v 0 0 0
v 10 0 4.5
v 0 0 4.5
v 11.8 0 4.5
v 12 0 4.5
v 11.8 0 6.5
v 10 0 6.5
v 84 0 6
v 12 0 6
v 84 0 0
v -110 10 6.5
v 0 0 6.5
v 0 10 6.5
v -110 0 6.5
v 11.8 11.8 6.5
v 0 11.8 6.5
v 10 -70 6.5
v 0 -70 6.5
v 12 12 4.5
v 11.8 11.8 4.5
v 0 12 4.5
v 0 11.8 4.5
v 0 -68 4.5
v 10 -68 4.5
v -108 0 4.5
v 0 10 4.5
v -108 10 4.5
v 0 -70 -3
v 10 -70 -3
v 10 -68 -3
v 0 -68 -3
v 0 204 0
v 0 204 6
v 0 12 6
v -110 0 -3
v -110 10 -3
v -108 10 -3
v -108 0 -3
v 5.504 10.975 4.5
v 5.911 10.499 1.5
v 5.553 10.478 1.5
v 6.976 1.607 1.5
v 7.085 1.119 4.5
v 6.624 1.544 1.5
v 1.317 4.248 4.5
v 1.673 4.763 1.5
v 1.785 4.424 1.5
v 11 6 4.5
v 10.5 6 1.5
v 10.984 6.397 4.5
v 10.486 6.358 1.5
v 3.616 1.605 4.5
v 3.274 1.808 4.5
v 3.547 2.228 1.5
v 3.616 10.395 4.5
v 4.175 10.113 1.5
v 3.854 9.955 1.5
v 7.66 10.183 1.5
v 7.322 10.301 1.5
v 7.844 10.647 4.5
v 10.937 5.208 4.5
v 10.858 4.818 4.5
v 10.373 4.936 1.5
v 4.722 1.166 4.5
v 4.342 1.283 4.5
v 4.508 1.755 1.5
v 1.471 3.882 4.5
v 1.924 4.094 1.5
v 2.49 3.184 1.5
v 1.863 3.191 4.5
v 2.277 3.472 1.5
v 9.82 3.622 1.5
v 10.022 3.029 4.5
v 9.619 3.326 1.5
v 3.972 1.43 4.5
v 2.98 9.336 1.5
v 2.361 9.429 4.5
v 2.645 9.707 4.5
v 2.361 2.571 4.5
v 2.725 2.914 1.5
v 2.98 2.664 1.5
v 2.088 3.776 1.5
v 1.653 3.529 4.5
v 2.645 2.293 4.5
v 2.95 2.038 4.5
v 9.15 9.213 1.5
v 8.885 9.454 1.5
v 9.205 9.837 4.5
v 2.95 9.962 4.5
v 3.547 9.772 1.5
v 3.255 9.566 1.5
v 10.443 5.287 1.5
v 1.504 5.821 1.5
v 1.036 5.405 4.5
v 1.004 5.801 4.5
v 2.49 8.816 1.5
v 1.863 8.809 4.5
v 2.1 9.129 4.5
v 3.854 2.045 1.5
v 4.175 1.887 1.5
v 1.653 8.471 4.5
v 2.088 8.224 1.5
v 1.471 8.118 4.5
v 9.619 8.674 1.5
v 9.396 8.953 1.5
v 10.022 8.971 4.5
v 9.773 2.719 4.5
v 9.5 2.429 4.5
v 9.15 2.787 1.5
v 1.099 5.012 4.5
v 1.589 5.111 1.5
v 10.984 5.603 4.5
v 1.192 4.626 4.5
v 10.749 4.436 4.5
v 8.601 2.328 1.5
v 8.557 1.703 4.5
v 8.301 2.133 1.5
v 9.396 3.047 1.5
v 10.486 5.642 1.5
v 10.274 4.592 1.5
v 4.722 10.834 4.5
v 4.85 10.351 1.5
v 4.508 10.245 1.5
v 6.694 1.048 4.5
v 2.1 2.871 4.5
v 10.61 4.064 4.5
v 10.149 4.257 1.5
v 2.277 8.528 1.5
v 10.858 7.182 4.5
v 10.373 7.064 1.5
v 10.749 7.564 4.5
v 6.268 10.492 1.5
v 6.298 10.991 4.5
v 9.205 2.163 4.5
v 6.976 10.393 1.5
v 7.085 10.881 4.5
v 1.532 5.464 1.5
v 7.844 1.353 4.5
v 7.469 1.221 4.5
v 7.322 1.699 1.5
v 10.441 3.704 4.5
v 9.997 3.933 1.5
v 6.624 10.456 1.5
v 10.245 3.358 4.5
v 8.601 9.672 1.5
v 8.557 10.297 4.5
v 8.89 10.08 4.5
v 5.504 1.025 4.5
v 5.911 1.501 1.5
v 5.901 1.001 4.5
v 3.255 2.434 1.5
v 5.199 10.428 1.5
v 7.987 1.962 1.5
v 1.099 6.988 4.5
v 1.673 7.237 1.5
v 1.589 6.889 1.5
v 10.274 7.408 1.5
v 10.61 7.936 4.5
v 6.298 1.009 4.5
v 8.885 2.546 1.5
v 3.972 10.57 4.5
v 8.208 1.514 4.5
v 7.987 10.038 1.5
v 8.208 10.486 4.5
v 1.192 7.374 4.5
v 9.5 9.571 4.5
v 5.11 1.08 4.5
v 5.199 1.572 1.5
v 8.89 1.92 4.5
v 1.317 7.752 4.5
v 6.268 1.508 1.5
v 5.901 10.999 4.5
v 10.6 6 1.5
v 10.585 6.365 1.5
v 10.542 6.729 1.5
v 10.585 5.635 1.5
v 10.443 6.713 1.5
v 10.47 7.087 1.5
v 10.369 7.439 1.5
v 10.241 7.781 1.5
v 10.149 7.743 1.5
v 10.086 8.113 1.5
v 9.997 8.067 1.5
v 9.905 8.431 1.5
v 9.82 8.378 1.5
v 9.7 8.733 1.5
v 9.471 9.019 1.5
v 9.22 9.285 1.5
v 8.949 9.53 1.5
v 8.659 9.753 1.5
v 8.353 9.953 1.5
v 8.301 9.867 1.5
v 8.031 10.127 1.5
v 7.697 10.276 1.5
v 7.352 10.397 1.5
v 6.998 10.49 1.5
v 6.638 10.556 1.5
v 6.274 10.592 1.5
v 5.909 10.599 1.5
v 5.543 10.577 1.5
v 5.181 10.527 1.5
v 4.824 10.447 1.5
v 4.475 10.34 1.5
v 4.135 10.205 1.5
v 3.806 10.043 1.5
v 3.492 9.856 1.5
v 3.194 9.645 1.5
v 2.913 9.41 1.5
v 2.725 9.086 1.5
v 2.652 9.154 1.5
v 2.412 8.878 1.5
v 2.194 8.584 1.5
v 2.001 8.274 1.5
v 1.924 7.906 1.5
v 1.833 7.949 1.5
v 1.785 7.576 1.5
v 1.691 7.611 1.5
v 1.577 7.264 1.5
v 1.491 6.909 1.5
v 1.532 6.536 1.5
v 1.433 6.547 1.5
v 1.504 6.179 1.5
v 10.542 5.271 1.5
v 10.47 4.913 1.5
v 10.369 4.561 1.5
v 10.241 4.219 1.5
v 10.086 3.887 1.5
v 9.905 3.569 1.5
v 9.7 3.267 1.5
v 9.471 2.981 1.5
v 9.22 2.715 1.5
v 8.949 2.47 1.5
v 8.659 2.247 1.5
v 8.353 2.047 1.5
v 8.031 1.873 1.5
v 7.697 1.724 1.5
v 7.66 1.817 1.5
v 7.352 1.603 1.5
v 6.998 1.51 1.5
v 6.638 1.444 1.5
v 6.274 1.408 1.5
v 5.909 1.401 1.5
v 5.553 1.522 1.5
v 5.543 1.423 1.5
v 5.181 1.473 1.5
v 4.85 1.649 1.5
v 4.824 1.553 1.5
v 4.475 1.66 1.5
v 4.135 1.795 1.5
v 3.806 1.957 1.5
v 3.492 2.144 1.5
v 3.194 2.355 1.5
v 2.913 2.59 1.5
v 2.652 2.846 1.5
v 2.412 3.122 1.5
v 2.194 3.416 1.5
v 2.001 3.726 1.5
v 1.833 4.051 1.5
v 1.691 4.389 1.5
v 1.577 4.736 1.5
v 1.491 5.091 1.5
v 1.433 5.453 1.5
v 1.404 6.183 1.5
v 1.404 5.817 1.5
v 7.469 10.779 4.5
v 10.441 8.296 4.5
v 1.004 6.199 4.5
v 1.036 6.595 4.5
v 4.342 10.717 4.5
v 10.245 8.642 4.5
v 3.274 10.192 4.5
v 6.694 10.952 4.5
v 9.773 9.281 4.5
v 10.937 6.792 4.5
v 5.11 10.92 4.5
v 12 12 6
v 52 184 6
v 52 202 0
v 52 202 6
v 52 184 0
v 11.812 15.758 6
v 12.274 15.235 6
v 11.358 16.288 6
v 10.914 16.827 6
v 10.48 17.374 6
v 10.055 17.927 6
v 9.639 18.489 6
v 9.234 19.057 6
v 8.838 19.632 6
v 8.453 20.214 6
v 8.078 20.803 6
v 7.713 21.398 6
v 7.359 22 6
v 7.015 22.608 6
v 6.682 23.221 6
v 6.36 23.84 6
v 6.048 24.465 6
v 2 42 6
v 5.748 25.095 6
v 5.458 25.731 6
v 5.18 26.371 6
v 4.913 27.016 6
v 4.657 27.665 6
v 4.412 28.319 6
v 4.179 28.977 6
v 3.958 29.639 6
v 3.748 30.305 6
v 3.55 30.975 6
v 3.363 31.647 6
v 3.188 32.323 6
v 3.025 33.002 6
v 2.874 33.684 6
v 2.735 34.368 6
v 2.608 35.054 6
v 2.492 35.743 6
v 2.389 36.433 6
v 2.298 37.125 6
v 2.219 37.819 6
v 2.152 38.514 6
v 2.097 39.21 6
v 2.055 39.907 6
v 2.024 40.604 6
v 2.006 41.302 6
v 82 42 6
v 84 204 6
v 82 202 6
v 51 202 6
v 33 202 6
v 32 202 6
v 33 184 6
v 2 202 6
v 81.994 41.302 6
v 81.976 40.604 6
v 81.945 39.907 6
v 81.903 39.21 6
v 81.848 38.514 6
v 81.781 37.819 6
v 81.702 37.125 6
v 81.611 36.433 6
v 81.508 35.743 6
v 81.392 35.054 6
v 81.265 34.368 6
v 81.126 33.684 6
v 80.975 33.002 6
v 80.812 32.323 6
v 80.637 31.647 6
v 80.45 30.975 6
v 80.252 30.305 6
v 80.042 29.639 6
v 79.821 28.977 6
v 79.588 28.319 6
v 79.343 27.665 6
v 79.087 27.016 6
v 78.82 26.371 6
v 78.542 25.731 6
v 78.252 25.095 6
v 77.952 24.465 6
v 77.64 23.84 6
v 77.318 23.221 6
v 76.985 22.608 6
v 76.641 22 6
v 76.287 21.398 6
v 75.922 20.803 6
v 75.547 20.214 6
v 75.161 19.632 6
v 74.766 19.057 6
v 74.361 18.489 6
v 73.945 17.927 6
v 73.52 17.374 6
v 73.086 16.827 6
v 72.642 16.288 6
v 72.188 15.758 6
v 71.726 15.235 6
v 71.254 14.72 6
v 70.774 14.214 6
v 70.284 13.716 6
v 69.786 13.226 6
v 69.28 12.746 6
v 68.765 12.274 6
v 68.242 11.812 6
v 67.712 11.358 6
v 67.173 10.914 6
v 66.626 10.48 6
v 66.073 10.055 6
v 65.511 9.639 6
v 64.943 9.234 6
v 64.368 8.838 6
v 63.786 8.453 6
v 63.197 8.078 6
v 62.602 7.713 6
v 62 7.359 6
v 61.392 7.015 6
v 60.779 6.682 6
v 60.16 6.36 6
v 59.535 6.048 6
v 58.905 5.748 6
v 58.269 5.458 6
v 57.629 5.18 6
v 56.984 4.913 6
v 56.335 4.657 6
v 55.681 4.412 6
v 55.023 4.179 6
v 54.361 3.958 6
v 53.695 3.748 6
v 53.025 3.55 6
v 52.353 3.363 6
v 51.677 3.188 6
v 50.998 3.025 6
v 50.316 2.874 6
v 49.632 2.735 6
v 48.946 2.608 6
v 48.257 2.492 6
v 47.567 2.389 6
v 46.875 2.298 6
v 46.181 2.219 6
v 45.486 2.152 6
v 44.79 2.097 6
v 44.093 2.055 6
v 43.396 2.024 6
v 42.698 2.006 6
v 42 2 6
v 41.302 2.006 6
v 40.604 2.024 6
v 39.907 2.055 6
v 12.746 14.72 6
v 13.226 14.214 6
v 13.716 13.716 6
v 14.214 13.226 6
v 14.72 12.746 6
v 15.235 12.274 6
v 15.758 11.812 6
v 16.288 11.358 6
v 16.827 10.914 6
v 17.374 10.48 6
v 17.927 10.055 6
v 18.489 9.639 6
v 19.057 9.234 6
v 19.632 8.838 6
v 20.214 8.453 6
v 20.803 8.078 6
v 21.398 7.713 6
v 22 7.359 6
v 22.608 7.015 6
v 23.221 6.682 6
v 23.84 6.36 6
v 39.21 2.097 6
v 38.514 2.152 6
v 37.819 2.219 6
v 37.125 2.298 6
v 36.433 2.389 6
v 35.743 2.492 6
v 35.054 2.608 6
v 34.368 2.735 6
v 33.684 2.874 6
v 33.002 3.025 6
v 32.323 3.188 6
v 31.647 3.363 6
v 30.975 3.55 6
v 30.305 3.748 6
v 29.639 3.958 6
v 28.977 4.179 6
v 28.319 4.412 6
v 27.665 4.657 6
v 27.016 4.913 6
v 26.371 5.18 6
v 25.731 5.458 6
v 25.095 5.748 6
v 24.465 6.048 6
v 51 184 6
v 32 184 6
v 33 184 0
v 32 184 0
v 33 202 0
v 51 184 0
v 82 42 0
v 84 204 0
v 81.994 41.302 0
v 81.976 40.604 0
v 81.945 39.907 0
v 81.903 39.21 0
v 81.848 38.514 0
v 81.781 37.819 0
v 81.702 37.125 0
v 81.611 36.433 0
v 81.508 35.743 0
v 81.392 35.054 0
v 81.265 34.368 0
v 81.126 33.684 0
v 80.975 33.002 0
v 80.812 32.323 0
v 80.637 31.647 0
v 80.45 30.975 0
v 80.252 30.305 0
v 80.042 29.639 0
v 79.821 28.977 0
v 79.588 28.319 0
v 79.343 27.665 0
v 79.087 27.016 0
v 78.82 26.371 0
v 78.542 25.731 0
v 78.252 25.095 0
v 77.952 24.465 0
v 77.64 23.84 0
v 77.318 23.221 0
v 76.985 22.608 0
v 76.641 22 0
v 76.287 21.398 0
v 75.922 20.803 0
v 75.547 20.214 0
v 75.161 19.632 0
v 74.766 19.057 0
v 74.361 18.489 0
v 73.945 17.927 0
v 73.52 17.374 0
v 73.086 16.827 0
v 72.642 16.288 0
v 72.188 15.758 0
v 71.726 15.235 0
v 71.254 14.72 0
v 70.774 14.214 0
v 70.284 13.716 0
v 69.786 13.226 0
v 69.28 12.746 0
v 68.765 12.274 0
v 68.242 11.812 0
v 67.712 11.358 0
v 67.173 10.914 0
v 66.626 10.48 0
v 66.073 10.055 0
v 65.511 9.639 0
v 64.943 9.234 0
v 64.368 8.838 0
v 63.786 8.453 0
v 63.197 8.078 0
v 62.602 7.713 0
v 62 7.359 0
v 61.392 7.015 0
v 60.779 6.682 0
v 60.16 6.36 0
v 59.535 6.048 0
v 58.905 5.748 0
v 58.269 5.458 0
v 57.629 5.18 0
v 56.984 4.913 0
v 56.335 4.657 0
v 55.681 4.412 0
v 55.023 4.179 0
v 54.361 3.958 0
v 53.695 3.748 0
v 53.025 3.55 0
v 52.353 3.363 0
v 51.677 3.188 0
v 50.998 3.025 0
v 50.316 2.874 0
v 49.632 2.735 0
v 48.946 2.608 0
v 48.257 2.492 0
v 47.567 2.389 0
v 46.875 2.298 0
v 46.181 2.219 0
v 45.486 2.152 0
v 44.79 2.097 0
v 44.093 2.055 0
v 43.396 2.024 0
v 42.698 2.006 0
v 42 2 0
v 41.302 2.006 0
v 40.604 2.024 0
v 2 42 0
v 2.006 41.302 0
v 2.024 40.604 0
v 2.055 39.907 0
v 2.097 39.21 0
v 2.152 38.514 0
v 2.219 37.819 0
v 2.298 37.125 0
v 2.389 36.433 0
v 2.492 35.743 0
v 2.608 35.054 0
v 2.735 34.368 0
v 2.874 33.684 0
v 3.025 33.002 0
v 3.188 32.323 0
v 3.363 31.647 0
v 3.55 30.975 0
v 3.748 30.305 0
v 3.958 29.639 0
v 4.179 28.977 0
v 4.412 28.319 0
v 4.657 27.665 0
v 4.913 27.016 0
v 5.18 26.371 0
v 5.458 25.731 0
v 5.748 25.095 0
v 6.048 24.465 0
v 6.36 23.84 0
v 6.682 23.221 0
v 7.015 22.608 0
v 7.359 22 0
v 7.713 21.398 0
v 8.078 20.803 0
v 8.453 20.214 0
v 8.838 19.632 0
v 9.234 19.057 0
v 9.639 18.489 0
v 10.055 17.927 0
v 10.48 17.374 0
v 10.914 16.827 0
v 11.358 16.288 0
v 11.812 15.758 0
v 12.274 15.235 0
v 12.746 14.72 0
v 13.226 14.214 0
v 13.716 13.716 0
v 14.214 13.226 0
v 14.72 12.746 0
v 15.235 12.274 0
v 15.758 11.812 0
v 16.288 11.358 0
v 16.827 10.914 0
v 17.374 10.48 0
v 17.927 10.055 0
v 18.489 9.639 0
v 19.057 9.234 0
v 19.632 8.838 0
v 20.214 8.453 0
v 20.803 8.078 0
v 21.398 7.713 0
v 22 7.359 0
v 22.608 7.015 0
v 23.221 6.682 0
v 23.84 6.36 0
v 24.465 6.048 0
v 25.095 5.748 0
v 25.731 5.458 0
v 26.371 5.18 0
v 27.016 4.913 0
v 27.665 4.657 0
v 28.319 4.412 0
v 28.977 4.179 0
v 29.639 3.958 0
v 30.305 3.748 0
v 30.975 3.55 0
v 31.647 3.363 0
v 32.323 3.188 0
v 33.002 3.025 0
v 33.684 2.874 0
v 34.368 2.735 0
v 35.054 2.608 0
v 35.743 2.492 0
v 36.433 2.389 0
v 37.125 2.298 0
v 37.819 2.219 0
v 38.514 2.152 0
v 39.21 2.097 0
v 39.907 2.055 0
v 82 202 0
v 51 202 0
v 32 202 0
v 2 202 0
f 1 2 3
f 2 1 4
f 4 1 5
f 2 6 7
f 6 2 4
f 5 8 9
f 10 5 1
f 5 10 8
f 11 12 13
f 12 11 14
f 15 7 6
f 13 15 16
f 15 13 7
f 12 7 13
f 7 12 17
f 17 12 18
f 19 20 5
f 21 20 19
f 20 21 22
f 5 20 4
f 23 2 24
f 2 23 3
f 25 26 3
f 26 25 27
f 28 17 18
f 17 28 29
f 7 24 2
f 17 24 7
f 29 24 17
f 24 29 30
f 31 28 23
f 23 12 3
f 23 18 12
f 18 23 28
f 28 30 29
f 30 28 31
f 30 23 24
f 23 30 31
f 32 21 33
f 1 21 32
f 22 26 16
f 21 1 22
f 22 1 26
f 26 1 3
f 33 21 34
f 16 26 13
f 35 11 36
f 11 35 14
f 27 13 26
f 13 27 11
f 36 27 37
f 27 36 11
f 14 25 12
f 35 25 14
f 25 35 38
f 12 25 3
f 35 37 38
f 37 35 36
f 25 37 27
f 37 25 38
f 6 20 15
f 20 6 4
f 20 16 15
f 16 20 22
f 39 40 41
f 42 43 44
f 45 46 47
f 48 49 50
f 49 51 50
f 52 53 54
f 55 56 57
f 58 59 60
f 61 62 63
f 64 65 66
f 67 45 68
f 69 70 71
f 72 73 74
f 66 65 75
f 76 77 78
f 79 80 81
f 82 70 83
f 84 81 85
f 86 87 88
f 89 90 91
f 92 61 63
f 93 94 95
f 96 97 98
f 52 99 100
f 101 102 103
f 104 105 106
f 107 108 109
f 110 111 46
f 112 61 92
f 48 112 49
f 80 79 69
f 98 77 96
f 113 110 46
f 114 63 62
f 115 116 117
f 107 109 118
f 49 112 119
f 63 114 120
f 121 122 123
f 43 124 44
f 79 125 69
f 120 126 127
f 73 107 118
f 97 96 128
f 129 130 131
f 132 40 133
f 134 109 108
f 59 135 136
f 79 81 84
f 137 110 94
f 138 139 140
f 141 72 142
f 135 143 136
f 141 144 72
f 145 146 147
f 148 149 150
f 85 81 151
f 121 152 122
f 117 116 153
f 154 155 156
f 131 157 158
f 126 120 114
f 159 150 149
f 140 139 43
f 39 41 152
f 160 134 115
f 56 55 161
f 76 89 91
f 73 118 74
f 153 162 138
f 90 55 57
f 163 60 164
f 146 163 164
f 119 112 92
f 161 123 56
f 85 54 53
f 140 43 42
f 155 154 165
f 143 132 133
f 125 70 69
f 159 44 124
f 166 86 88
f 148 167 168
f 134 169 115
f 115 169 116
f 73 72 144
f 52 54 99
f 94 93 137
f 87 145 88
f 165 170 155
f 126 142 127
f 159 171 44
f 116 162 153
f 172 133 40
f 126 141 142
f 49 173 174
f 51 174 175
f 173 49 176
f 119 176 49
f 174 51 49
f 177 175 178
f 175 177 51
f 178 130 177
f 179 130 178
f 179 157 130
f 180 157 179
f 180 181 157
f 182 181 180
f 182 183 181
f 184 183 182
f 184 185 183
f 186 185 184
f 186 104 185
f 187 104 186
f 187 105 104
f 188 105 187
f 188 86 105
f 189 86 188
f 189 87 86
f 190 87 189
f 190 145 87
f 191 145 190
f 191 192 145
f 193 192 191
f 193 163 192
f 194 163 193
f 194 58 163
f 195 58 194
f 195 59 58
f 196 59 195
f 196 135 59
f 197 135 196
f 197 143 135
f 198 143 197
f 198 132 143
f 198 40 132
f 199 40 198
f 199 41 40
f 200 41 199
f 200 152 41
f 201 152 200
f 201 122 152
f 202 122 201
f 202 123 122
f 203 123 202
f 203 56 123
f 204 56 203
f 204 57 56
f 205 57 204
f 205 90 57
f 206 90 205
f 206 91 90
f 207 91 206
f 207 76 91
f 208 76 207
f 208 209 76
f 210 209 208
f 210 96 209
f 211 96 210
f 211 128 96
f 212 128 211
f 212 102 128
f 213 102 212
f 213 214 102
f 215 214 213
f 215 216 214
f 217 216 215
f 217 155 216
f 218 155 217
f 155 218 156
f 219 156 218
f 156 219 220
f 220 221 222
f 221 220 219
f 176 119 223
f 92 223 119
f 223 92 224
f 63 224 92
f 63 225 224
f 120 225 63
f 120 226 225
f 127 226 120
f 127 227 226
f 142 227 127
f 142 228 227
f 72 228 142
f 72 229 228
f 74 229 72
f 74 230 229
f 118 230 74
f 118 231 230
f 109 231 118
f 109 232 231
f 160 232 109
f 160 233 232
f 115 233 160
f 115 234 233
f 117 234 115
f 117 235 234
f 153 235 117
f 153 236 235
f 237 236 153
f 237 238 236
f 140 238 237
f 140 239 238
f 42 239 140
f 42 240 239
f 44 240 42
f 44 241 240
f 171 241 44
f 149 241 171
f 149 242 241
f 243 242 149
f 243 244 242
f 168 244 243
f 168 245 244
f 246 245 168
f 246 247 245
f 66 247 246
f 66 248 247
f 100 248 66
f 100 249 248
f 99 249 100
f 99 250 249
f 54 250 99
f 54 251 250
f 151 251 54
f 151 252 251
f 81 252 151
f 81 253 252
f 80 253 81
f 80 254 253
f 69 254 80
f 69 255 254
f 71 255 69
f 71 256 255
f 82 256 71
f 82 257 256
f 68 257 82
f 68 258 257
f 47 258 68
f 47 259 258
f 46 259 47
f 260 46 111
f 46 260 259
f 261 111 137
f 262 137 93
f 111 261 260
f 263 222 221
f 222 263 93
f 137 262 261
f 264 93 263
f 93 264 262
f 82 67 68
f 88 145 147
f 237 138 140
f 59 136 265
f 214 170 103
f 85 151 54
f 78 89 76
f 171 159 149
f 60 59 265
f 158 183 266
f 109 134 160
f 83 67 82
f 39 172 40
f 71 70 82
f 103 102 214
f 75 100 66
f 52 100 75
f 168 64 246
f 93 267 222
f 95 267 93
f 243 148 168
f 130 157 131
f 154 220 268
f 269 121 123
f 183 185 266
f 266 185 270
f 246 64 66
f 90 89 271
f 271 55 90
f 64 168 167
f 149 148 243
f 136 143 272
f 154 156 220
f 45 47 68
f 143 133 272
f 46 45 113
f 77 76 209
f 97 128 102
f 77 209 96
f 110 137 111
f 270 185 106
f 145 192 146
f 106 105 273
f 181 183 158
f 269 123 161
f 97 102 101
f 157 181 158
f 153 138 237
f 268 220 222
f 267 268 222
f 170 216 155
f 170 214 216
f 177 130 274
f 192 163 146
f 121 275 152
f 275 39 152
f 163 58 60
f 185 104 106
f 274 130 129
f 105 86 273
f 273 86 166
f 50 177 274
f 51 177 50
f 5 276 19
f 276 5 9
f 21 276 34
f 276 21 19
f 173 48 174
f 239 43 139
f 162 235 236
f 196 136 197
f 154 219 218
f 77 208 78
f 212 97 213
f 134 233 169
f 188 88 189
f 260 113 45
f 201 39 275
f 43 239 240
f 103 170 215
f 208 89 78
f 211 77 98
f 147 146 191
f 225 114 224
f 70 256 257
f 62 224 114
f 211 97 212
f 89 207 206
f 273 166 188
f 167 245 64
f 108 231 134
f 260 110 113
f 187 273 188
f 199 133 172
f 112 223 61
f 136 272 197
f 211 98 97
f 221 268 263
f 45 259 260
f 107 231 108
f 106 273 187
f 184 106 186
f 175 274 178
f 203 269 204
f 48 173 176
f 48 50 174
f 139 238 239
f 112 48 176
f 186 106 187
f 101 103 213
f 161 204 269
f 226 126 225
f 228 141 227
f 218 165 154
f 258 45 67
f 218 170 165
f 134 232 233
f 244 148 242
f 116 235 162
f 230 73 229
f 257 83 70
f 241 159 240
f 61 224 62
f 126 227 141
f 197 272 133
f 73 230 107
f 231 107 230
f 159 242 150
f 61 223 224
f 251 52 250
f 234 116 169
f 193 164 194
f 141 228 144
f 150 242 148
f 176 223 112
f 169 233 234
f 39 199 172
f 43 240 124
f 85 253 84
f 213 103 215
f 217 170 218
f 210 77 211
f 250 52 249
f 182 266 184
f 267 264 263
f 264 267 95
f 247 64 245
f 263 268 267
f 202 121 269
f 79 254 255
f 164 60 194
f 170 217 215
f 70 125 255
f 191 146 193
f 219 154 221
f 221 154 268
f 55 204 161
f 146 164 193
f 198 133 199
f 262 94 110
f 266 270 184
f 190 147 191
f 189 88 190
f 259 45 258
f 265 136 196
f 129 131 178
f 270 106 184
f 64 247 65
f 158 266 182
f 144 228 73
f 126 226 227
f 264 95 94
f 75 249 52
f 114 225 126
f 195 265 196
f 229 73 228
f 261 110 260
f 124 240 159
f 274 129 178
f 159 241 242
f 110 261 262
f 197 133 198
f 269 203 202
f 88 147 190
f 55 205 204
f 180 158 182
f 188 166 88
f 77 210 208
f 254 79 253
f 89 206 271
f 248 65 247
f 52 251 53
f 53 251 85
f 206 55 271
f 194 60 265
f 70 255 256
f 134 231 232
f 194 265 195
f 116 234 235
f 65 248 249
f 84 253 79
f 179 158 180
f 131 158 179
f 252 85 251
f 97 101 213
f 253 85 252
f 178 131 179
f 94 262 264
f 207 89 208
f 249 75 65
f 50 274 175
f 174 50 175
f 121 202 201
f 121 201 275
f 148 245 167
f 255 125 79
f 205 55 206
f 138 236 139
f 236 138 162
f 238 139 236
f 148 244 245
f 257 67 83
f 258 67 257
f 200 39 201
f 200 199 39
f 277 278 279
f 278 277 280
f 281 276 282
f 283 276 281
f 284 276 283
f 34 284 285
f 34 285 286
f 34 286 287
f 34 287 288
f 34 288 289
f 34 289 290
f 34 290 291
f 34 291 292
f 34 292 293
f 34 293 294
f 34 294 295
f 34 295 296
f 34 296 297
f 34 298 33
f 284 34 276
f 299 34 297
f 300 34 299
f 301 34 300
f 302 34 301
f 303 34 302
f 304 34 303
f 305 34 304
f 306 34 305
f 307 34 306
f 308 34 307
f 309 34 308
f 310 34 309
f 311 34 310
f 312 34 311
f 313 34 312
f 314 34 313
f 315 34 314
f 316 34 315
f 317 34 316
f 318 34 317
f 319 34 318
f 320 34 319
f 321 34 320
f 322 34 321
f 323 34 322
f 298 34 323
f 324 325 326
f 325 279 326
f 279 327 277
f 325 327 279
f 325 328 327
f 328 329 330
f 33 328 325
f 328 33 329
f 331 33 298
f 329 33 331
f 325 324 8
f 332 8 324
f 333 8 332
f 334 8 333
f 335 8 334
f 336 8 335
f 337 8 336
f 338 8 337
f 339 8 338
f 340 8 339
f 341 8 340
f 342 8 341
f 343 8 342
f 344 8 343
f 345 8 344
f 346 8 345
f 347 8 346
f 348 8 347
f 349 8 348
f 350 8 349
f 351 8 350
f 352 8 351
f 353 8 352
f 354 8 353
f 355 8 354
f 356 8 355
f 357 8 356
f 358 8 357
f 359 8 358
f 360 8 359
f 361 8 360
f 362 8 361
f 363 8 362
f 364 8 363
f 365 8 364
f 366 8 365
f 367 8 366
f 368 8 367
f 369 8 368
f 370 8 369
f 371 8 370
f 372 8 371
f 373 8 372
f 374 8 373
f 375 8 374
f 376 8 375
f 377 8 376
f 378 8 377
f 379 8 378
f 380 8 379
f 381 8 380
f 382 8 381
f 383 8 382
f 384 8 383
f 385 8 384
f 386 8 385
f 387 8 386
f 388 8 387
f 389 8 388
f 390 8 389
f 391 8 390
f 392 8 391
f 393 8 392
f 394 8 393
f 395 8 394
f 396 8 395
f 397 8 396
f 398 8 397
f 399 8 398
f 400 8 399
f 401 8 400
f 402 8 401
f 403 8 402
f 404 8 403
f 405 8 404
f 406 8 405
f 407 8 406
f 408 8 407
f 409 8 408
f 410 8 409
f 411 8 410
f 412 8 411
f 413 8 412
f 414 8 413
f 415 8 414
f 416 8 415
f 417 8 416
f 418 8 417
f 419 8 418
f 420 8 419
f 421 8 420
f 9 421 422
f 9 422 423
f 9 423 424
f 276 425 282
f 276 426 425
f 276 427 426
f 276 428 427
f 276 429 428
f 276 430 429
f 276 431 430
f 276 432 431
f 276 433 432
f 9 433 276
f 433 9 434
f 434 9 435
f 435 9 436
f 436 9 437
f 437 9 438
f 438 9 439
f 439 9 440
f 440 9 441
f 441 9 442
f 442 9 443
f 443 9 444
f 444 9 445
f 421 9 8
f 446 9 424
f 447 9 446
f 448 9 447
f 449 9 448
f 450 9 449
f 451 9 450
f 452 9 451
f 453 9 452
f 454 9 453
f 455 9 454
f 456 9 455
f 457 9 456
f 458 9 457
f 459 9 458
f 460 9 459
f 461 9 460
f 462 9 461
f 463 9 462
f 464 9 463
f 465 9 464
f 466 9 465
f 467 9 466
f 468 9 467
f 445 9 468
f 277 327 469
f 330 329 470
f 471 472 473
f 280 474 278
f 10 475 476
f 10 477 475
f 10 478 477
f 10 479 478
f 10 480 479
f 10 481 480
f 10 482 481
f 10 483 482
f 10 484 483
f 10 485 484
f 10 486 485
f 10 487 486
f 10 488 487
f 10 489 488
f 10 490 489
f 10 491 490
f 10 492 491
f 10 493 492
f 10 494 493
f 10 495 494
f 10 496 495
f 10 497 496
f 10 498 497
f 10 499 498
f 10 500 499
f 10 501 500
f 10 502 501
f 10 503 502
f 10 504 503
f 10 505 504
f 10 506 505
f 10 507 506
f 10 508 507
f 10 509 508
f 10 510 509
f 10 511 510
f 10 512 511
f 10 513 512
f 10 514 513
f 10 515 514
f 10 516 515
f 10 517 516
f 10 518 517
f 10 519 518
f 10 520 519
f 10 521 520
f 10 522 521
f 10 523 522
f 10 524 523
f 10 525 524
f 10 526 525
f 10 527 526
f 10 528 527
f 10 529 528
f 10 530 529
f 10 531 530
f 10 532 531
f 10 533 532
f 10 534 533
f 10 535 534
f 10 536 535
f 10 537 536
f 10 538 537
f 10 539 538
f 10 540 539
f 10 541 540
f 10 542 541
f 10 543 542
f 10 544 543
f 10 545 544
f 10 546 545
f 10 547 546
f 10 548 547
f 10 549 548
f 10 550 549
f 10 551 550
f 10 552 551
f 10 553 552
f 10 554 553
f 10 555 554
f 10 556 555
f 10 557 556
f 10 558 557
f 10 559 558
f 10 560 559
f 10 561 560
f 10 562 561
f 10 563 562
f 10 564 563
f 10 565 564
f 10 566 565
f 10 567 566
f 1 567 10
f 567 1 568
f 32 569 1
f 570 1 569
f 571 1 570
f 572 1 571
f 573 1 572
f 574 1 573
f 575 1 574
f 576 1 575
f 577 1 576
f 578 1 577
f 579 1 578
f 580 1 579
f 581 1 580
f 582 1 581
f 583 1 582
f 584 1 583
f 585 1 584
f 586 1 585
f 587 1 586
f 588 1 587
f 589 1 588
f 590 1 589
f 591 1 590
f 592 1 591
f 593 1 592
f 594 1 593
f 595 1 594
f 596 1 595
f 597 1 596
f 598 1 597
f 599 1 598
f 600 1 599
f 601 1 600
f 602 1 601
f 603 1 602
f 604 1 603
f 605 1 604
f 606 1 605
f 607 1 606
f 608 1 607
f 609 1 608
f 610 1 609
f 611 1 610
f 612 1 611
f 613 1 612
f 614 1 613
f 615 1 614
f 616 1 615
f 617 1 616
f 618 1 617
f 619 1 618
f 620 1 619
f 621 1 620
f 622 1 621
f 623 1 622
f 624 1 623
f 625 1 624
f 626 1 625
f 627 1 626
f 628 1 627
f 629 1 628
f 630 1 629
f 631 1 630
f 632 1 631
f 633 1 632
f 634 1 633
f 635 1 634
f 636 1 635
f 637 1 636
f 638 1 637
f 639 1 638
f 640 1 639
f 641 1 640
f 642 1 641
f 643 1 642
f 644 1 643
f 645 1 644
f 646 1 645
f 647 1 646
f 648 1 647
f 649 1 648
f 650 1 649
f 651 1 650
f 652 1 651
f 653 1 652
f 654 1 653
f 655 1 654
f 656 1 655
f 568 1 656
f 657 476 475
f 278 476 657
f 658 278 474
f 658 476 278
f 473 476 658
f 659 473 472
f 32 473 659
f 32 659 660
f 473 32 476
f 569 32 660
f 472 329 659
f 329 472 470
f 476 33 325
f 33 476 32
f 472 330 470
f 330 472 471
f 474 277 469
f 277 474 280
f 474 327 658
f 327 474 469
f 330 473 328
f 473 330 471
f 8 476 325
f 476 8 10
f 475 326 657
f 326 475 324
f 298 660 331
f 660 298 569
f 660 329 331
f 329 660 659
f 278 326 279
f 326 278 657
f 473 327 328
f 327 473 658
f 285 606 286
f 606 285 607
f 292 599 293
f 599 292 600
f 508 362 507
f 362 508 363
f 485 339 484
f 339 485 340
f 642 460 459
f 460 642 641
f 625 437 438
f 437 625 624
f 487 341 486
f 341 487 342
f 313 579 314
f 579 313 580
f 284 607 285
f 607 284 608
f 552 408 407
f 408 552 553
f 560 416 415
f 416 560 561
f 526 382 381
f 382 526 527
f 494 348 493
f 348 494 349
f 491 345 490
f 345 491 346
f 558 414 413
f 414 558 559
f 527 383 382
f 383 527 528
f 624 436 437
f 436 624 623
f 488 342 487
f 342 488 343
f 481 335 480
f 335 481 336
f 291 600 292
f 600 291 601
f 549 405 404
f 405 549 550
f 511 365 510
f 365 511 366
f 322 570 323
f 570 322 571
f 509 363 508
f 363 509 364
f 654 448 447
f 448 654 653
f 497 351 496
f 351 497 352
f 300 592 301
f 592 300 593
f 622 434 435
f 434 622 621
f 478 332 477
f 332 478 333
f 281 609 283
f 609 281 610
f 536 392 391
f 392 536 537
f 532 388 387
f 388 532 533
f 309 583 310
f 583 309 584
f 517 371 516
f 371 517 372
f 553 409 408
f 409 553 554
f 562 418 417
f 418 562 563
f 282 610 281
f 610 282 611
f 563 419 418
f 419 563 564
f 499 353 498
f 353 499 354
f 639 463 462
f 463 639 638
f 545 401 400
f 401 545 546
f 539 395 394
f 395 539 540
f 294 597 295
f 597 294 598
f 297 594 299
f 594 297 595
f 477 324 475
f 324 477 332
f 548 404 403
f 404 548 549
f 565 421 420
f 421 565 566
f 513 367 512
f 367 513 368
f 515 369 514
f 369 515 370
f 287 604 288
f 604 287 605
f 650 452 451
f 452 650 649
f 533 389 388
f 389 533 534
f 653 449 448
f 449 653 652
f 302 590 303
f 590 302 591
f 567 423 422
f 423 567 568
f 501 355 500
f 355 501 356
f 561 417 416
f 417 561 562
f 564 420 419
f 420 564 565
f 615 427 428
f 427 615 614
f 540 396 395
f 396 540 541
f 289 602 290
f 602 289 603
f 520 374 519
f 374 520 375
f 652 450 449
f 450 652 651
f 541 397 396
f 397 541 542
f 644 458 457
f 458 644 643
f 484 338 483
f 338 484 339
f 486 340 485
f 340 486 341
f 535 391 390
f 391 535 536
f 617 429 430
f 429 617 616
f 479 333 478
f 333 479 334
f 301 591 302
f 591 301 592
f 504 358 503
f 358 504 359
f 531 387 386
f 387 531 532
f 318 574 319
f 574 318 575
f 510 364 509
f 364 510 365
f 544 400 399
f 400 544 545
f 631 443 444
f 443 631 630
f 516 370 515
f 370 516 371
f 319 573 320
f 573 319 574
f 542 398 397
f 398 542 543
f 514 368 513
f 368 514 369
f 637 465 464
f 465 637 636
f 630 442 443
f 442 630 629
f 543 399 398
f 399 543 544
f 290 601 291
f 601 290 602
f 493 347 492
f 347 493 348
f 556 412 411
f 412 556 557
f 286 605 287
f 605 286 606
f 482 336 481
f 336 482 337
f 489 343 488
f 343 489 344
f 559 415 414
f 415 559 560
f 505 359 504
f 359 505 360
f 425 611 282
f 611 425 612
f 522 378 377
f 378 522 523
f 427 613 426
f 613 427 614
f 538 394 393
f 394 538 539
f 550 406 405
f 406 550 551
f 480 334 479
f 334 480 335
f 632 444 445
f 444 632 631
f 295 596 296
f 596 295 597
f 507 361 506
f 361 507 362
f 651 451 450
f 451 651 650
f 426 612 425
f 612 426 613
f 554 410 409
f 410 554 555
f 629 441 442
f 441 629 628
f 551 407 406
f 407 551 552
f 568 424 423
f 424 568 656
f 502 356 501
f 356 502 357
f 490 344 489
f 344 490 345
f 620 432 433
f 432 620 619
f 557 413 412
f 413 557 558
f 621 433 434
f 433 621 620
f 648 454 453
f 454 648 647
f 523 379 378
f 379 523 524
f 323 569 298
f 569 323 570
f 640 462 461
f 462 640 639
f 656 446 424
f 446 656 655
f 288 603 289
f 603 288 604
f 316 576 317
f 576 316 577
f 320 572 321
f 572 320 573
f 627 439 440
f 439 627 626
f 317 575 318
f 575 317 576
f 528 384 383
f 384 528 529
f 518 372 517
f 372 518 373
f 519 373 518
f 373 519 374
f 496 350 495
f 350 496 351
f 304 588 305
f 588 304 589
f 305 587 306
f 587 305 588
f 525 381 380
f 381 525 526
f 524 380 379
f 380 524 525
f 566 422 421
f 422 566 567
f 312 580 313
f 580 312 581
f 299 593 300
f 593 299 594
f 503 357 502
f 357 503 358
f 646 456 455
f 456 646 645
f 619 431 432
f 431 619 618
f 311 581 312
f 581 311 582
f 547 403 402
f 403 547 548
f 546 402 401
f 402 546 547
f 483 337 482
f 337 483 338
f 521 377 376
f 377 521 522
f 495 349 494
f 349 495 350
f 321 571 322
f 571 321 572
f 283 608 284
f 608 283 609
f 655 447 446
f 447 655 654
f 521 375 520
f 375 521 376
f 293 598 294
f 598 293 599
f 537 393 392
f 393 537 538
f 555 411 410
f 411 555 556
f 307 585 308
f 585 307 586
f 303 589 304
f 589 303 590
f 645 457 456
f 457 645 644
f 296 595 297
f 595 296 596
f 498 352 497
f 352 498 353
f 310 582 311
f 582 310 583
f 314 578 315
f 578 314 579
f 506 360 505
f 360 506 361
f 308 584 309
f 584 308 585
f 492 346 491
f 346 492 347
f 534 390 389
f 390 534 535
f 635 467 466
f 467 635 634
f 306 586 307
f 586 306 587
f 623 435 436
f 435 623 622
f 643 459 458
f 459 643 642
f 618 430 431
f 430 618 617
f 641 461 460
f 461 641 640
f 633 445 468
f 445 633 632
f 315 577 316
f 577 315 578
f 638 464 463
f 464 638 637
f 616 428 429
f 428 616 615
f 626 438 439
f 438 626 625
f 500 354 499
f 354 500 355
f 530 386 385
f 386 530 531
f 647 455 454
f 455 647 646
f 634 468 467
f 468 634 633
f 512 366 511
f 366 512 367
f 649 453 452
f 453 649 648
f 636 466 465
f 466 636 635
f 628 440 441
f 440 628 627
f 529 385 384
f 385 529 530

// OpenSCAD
$fa = 1;
$fs = 0.4;

// registrations
#union() {
translate([0, 0, 4.5])
    cube([11.8, 11.8, 2]);

translate([6, 6, 1.5])    
    cylinder(3, 4.5, 5);

translate([0, 0, 4.5]) {
    // 7cm to top edge
    translate([0, -70])
        mirror([1, 0, 0])
            rotate([0,0,90]) {
                cube([70, 10, 2]);
                rotate([0, 90, 0])
                    cube([7.5, 10, 2]);
            }

    // 11cm to left edge
    translate([-110, 0]) {
        cube([110, 10, 2]);
        rotate([0, 90, 0])
            cube([7.5, 10, 2]);
    }
}
}


// main form

translate([6, 6, 1.5])
    difference() {
        translate([-6,-6])
            cube([12, 12, 3]);
        cylinder(3, 4.6, 5);
    }


// stick position/support
translate([42, 204-10, 3]){
    // 17.75 popsickle stick width
    difference() {
        cube([20, 20, 6], true);
        cube([18, 20, 6], true);
    }
}

// ice cream, with stick
// [80,200,2]
difference() {
    cube([84,204,6]);
    
    translate([0,0,1.5])
        cube([12, 12, 4.51]);
   
    translate([2,42])
        cube([80,160,6]);
    translate([42, 42])
        cylinder(6, 40, 40, false);
}
